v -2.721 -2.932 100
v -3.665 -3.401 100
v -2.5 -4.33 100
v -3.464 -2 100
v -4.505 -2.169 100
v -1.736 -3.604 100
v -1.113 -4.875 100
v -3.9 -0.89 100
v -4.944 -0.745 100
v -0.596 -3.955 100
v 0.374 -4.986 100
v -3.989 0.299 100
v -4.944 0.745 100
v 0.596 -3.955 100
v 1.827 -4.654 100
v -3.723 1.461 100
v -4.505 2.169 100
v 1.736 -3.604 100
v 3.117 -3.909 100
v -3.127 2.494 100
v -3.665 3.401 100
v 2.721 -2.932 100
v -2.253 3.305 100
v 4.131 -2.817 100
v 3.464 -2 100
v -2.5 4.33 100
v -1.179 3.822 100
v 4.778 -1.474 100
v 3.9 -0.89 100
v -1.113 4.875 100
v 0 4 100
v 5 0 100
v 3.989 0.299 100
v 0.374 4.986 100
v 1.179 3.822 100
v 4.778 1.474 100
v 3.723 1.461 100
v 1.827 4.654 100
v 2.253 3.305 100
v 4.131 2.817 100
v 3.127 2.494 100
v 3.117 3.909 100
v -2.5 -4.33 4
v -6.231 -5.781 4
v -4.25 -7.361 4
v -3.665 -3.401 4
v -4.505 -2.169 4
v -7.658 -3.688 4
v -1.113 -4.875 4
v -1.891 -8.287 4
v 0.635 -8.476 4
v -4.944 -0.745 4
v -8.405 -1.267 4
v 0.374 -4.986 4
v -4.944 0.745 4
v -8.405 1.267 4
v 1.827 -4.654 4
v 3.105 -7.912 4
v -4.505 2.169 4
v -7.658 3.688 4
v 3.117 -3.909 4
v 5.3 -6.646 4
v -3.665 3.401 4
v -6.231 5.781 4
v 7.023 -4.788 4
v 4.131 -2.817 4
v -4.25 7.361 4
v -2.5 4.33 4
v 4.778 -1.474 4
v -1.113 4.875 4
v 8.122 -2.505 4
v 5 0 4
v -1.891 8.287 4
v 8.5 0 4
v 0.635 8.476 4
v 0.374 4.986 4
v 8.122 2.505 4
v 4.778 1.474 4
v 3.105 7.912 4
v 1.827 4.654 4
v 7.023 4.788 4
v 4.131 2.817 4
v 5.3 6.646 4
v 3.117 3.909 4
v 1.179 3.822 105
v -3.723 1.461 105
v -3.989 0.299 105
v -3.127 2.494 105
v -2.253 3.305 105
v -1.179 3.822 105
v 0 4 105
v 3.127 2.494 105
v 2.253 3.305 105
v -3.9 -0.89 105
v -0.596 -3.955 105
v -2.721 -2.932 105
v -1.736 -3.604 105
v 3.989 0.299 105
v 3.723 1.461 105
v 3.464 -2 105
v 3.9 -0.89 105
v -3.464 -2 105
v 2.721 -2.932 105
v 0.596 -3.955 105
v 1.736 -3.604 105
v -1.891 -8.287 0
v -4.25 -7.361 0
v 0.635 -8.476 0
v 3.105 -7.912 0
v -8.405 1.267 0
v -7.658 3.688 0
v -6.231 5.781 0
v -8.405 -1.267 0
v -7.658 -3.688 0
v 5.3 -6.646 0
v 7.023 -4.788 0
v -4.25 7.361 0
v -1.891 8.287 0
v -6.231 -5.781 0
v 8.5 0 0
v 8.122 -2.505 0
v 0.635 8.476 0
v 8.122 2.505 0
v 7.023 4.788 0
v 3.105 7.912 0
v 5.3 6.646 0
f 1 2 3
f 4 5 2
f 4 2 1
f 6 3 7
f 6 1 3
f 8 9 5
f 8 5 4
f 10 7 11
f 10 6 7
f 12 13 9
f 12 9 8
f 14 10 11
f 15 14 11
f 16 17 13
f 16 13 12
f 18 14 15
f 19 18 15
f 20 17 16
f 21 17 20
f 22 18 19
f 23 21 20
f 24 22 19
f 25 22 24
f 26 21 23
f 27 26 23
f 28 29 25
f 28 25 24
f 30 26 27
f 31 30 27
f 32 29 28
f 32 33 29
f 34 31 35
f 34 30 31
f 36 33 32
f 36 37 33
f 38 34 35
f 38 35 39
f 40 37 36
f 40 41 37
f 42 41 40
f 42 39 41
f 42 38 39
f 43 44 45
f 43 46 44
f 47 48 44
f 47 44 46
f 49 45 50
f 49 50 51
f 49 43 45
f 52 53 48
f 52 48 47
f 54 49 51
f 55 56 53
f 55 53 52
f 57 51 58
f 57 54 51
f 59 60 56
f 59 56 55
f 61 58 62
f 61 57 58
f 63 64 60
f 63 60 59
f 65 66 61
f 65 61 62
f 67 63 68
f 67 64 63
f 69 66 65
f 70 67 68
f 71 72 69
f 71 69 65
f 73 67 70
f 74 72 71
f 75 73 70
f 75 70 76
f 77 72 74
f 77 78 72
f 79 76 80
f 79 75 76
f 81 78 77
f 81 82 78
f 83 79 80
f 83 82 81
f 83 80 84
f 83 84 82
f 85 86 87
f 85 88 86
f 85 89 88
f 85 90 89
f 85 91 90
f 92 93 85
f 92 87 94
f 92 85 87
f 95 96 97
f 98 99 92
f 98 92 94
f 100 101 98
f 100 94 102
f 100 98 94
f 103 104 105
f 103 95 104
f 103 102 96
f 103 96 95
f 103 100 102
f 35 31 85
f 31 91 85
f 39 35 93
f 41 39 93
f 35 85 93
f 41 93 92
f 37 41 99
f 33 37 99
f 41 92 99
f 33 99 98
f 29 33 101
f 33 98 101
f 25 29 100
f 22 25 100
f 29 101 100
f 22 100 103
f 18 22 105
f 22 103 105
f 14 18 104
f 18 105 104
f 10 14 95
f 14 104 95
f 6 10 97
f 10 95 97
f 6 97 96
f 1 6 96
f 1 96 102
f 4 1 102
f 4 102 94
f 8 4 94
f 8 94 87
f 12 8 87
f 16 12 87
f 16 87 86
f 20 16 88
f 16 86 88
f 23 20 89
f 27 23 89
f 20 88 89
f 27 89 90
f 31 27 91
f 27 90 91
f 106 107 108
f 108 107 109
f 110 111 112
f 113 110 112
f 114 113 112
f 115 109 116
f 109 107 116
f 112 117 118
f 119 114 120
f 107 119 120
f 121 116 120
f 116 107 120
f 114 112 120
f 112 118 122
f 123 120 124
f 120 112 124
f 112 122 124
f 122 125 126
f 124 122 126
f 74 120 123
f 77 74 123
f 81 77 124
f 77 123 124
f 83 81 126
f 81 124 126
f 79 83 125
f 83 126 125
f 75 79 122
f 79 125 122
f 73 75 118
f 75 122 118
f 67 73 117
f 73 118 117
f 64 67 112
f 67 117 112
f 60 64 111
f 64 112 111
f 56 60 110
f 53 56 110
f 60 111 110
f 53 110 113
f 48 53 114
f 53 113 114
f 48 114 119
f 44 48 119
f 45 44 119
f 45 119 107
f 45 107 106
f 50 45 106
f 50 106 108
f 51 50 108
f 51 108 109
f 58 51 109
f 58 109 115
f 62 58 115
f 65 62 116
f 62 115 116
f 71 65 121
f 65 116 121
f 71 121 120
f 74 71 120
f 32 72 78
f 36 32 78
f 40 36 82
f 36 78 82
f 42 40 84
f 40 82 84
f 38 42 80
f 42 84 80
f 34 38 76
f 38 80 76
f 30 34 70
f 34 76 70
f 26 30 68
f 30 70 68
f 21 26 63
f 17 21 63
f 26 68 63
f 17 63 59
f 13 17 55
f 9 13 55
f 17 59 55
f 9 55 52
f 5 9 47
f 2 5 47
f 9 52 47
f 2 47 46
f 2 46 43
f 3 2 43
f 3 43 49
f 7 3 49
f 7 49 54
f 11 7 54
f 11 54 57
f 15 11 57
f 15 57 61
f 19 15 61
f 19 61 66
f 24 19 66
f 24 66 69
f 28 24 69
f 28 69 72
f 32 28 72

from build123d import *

# Parameters (mm, degrees)
F0_R     = 8.5
F1_DEPTH = 4
F2_R     = 5
F3_DEPTH = 100
F4_W     = 4
F4_H     = 5


with BuildPart() as f1:
    # F0 (on Top) → F1 (new body)
    with BuildSketch(Plane.XY):
        Circle(F0_R)
    extrude(amount=F1_DEPTH)

    # F2 (on Top) → F3 (join)
    with BuildSketch(Plane.XY):
        Circle(F2_R)
    extrude(amount=F3_DEPTH)

    # F4 (on Right) → F5 (revolve)
    with BuildSketch(Plane.YZ):
        with Locations((2, 102.5)):
            Rectangle(F4_W, F4_H)
    revolve(axis=Axis((0, 0, 102.5), (0, 0, -1)))


solid = f1.part
